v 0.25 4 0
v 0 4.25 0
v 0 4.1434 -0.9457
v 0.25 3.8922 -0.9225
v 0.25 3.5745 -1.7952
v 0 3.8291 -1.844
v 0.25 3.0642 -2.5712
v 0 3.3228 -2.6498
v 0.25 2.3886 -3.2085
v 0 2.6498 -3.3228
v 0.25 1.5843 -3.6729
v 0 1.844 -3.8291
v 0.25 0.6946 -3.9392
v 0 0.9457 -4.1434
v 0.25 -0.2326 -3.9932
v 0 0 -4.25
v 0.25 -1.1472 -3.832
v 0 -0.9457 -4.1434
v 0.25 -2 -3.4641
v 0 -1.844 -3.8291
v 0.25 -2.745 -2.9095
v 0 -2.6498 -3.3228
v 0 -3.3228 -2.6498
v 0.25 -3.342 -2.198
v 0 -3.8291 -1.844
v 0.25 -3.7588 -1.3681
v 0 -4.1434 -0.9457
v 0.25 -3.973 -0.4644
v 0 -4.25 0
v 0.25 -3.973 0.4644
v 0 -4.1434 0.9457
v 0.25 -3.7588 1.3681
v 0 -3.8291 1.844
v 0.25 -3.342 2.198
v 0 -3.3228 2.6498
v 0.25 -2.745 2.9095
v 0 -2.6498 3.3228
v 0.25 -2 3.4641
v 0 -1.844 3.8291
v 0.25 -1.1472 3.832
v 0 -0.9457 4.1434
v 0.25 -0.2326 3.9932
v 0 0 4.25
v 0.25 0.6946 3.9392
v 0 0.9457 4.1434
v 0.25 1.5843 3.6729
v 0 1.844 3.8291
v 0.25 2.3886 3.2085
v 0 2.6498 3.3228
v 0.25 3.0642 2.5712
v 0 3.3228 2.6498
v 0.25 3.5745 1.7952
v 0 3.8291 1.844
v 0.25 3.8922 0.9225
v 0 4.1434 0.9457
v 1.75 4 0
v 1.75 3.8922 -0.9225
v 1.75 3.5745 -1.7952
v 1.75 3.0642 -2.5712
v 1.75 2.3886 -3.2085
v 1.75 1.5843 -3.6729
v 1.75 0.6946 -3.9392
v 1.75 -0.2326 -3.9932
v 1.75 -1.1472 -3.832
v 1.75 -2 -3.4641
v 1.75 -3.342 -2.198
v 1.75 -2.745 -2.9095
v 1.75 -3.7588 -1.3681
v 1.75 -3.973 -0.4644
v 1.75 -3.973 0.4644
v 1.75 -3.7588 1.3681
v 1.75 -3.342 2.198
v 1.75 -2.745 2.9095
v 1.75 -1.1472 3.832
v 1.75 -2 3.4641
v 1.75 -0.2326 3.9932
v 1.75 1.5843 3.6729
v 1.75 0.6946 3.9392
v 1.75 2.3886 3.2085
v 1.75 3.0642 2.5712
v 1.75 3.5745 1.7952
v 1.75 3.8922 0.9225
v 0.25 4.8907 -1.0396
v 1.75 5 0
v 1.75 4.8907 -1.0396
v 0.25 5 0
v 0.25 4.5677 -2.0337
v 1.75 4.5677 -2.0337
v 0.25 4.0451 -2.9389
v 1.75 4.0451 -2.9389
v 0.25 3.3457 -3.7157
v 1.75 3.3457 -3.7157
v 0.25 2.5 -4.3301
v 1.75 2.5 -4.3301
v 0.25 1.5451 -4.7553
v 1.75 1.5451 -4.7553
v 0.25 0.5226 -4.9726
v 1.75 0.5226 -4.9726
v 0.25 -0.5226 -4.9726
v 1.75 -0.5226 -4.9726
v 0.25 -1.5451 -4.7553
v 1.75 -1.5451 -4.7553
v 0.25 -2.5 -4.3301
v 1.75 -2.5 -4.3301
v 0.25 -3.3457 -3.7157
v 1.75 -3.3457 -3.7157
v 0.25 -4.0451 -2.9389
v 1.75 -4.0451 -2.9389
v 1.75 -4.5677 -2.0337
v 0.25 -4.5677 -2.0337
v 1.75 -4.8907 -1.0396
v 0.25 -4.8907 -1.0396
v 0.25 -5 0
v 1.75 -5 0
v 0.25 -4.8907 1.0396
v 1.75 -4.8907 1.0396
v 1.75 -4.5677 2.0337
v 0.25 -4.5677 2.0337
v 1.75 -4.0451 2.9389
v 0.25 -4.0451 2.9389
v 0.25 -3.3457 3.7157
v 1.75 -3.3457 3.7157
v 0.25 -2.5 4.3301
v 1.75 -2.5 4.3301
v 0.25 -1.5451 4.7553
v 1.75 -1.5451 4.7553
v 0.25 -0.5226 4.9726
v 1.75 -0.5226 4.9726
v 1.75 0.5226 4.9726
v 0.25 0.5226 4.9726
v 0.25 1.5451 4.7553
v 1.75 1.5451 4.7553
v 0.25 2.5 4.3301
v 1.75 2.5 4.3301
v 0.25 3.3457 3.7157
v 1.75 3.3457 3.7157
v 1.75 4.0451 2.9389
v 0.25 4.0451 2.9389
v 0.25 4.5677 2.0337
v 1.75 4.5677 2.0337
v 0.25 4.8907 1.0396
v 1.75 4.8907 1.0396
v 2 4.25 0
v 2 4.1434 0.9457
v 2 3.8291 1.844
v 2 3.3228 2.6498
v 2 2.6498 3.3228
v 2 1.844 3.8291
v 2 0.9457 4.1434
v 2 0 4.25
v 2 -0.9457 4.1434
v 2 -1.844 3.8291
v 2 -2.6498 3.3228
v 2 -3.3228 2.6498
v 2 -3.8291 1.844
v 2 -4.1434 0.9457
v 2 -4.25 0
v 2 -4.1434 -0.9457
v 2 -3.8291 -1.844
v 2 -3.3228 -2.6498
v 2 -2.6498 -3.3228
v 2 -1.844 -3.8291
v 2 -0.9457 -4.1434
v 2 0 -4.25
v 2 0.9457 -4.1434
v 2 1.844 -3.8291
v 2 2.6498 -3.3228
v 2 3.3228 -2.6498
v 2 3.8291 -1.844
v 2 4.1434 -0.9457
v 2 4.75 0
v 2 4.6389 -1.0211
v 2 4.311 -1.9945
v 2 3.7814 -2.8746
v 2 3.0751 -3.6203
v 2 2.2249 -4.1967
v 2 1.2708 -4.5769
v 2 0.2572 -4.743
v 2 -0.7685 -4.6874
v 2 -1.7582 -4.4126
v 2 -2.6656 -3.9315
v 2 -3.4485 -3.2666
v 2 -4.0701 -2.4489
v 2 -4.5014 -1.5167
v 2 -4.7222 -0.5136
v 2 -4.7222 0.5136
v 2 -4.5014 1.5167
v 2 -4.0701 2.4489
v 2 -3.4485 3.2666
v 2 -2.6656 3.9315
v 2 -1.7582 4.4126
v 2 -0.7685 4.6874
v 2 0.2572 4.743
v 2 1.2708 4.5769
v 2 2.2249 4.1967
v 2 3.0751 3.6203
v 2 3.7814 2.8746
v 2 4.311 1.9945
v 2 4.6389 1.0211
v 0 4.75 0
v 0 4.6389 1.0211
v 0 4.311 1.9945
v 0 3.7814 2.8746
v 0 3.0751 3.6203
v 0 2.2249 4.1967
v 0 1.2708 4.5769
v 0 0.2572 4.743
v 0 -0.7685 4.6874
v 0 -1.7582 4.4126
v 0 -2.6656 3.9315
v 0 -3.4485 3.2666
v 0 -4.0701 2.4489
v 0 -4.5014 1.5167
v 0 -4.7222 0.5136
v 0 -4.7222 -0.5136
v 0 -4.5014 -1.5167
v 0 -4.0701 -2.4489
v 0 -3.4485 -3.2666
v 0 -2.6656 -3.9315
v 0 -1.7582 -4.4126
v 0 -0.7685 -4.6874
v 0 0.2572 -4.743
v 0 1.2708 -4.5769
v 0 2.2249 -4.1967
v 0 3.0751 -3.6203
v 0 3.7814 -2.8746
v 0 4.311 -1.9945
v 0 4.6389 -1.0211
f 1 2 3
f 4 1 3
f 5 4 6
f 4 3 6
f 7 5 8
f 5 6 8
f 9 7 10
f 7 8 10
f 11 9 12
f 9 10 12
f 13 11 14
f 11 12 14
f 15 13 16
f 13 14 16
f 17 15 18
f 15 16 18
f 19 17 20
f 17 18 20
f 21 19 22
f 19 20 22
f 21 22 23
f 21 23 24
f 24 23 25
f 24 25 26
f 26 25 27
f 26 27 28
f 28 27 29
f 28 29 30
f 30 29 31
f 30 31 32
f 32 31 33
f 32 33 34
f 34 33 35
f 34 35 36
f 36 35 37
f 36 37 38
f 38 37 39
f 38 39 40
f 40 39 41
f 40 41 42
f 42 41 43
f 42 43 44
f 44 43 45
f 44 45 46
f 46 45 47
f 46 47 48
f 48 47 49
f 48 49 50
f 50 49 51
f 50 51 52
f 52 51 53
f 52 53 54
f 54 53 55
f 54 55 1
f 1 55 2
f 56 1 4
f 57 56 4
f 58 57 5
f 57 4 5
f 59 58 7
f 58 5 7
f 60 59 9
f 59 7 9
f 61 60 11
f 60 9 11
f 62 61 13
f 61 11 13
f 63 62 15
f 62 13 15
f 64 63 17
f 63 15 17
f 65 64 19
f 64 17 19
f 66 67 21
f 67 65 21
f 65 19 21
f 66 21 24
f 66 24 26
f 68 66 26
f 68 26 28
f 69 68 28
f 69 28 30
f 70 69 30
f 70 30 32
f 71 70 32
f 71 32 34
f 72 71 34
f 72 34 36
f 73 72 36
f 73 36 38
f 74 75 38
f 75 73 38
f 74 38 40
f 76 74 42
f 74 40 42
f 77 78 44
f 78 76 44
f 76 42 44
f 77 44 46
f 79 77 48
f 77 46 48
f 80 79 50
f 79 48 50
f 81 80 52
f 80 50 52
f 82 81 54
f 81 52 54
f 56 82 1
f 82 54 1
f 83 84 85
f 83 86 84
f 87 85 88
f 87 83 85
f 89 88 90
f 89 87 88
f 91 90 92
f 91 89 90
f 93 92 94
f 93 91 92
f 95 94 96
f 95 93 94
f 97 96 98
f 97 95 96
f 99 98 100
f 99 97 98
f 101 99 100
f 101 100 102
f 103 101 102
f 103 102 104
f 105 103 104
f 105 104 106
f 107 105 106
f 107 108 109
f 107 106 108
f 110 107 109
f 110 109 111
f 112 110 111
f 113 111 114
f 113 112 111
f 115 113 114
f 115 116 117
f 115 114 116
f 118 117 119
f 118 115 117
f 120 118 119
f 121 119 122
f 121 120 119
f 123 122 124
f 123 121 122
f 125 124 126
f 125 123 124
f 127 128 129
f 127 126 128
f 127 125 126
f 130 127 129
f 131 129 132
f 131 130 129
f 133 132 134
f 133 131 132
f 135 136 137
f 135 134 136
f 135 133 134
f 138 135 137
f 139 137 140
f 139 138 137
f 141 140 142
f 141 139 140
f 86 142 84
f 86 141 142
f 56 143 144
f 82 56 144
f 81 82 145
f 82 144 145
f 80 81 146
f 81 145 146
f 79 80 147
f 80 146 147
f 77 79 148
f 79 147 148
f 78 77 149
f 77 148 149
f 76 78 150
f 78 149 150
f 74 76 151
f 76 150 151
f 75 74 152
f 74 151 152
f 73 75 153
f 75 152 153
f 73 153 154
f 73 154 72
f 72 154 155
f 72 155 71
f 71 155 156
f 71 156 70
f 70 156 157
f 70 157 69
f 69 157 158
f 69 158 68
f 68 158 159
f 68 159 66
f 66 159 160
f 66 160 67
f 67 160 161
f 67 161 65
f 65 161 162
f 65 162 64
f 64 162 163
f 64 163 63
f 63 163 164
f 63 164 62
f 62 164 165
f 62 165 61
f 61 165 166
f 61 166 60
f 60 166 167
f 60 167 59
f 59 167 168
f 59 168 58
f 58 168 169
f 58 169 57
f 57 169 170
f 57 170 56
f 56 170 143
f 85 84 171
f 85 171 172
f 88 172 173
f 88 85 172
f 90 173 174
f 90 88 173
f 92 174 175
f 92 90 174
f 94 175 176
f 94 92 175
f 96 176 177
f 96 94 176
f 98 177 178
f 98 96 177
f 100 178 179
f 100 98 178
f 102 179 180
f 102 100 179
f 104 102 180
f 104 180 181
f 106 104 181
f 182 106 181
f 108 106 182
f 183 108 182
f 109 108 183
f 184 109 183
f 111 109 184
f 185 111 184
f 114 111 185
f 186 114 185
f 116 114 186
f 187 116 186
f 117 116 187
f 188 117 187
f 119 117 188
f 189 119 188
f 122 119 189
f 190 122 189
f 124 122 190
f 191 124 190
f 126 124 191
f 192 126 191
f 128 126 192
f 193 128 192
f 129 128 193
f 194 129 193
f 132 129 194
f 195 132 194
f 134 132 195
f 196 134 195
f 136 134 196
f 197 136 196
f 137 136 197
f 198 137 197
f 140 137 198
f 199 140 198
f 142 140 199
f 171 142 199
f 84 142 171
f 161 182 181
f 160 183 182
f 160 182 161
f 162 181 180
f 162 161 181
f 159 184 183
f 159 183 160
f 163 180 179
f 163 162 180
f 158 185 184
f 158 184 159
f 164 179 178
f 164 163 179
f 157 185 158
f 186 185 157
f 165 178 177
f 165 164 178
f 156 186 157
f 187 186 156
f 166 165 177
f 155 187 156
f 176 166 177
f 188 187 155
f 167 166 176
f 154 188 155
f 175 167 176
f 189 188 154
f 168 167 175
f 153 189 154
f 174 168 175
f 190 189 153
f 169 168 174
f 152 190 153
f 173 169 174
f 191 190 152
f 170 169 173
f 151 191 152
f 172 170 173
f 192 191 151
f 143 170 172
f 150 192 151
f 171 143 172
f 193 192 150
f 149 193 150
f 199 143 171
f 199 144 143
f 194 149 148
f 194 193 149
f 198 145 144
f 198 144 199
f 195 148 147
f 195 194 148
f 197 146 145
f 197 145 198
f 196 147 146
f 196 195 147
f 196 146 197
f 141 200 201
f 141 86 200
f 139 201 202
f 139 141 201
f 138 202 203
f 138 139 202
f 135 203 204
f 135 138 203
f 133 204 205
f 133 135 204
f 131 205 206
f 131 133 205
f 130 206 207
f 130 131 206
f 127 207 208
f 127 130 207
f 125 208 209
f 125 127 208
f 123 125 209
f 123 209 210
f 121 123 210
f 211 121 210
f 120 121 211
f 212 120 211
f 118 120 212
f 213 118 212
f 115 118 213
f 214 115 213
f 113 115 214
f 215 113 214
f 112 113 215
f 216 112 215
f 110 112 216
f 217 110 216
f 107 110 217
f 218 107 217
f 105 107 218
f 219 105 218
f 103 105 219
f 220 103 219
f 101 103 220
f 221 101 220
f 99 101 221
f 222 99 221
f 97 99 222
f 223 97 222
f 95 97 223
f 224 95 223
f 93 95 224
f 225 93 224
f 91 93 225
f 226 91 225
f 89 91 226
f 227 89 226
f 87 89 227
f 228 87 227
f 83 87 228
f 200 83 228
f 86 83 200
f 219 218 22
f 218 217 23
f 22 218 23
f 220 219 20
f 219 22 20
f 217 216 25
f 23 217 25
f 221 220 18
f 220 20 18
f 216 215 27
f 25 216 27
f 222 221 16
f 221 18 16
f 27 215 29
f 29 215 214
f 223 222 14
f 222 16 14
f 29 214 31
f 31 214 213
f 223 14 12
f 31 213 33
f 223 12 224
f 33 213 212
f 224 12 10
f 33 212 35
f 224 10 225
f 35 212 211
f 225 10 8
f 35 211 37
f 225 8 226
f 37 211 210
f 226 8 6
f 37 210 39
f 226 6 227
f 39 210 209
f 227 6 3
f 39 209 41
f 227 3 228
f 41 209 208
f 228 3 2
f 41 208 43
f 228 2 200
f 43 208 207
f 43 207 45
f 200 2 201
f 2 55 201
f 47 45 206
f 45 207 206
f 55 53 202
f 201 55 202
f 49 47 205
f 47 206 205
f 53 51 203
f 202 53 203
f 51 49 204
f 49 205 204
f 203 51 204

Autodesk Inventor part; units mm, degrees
ref_plane "YZ Plane" through (0, 0, 0) normal (1, 0, 0) x (0, 1, 0)
ref_plane "XZ Plane" through (0, 0, 0) normal (0, 1, 0) x (-1, 0, 0)
ref_plane "XY Plane" through (0, 0, 0) normal (0, 0, 1) x (1, 0, 0)
sketch "Sketch1" plane through (0, 0, 0) normal (1, 0, 0) x (0, 1, 0)
  circle A0 centre (0, 0) radius 4
  circle A1 centre (0, 0) radius 5
  dimension "d0" = 8
  dimension "d1" = 10
extrude "Extrusion1" add sketch "Sketch1" along normal blind 2
chamfer "Chamfer1" distance 0.25 angle 45 4 edges at (2, -5, 0) (0, -5, 0) (0, -4, 0) (2, -4, 0)
thread "Thread1" size "M8x0.5" class "6H" standard "ANSI Metric M Profile" length 10
properties part number "Component 30(Intake Pipe Ring)"
